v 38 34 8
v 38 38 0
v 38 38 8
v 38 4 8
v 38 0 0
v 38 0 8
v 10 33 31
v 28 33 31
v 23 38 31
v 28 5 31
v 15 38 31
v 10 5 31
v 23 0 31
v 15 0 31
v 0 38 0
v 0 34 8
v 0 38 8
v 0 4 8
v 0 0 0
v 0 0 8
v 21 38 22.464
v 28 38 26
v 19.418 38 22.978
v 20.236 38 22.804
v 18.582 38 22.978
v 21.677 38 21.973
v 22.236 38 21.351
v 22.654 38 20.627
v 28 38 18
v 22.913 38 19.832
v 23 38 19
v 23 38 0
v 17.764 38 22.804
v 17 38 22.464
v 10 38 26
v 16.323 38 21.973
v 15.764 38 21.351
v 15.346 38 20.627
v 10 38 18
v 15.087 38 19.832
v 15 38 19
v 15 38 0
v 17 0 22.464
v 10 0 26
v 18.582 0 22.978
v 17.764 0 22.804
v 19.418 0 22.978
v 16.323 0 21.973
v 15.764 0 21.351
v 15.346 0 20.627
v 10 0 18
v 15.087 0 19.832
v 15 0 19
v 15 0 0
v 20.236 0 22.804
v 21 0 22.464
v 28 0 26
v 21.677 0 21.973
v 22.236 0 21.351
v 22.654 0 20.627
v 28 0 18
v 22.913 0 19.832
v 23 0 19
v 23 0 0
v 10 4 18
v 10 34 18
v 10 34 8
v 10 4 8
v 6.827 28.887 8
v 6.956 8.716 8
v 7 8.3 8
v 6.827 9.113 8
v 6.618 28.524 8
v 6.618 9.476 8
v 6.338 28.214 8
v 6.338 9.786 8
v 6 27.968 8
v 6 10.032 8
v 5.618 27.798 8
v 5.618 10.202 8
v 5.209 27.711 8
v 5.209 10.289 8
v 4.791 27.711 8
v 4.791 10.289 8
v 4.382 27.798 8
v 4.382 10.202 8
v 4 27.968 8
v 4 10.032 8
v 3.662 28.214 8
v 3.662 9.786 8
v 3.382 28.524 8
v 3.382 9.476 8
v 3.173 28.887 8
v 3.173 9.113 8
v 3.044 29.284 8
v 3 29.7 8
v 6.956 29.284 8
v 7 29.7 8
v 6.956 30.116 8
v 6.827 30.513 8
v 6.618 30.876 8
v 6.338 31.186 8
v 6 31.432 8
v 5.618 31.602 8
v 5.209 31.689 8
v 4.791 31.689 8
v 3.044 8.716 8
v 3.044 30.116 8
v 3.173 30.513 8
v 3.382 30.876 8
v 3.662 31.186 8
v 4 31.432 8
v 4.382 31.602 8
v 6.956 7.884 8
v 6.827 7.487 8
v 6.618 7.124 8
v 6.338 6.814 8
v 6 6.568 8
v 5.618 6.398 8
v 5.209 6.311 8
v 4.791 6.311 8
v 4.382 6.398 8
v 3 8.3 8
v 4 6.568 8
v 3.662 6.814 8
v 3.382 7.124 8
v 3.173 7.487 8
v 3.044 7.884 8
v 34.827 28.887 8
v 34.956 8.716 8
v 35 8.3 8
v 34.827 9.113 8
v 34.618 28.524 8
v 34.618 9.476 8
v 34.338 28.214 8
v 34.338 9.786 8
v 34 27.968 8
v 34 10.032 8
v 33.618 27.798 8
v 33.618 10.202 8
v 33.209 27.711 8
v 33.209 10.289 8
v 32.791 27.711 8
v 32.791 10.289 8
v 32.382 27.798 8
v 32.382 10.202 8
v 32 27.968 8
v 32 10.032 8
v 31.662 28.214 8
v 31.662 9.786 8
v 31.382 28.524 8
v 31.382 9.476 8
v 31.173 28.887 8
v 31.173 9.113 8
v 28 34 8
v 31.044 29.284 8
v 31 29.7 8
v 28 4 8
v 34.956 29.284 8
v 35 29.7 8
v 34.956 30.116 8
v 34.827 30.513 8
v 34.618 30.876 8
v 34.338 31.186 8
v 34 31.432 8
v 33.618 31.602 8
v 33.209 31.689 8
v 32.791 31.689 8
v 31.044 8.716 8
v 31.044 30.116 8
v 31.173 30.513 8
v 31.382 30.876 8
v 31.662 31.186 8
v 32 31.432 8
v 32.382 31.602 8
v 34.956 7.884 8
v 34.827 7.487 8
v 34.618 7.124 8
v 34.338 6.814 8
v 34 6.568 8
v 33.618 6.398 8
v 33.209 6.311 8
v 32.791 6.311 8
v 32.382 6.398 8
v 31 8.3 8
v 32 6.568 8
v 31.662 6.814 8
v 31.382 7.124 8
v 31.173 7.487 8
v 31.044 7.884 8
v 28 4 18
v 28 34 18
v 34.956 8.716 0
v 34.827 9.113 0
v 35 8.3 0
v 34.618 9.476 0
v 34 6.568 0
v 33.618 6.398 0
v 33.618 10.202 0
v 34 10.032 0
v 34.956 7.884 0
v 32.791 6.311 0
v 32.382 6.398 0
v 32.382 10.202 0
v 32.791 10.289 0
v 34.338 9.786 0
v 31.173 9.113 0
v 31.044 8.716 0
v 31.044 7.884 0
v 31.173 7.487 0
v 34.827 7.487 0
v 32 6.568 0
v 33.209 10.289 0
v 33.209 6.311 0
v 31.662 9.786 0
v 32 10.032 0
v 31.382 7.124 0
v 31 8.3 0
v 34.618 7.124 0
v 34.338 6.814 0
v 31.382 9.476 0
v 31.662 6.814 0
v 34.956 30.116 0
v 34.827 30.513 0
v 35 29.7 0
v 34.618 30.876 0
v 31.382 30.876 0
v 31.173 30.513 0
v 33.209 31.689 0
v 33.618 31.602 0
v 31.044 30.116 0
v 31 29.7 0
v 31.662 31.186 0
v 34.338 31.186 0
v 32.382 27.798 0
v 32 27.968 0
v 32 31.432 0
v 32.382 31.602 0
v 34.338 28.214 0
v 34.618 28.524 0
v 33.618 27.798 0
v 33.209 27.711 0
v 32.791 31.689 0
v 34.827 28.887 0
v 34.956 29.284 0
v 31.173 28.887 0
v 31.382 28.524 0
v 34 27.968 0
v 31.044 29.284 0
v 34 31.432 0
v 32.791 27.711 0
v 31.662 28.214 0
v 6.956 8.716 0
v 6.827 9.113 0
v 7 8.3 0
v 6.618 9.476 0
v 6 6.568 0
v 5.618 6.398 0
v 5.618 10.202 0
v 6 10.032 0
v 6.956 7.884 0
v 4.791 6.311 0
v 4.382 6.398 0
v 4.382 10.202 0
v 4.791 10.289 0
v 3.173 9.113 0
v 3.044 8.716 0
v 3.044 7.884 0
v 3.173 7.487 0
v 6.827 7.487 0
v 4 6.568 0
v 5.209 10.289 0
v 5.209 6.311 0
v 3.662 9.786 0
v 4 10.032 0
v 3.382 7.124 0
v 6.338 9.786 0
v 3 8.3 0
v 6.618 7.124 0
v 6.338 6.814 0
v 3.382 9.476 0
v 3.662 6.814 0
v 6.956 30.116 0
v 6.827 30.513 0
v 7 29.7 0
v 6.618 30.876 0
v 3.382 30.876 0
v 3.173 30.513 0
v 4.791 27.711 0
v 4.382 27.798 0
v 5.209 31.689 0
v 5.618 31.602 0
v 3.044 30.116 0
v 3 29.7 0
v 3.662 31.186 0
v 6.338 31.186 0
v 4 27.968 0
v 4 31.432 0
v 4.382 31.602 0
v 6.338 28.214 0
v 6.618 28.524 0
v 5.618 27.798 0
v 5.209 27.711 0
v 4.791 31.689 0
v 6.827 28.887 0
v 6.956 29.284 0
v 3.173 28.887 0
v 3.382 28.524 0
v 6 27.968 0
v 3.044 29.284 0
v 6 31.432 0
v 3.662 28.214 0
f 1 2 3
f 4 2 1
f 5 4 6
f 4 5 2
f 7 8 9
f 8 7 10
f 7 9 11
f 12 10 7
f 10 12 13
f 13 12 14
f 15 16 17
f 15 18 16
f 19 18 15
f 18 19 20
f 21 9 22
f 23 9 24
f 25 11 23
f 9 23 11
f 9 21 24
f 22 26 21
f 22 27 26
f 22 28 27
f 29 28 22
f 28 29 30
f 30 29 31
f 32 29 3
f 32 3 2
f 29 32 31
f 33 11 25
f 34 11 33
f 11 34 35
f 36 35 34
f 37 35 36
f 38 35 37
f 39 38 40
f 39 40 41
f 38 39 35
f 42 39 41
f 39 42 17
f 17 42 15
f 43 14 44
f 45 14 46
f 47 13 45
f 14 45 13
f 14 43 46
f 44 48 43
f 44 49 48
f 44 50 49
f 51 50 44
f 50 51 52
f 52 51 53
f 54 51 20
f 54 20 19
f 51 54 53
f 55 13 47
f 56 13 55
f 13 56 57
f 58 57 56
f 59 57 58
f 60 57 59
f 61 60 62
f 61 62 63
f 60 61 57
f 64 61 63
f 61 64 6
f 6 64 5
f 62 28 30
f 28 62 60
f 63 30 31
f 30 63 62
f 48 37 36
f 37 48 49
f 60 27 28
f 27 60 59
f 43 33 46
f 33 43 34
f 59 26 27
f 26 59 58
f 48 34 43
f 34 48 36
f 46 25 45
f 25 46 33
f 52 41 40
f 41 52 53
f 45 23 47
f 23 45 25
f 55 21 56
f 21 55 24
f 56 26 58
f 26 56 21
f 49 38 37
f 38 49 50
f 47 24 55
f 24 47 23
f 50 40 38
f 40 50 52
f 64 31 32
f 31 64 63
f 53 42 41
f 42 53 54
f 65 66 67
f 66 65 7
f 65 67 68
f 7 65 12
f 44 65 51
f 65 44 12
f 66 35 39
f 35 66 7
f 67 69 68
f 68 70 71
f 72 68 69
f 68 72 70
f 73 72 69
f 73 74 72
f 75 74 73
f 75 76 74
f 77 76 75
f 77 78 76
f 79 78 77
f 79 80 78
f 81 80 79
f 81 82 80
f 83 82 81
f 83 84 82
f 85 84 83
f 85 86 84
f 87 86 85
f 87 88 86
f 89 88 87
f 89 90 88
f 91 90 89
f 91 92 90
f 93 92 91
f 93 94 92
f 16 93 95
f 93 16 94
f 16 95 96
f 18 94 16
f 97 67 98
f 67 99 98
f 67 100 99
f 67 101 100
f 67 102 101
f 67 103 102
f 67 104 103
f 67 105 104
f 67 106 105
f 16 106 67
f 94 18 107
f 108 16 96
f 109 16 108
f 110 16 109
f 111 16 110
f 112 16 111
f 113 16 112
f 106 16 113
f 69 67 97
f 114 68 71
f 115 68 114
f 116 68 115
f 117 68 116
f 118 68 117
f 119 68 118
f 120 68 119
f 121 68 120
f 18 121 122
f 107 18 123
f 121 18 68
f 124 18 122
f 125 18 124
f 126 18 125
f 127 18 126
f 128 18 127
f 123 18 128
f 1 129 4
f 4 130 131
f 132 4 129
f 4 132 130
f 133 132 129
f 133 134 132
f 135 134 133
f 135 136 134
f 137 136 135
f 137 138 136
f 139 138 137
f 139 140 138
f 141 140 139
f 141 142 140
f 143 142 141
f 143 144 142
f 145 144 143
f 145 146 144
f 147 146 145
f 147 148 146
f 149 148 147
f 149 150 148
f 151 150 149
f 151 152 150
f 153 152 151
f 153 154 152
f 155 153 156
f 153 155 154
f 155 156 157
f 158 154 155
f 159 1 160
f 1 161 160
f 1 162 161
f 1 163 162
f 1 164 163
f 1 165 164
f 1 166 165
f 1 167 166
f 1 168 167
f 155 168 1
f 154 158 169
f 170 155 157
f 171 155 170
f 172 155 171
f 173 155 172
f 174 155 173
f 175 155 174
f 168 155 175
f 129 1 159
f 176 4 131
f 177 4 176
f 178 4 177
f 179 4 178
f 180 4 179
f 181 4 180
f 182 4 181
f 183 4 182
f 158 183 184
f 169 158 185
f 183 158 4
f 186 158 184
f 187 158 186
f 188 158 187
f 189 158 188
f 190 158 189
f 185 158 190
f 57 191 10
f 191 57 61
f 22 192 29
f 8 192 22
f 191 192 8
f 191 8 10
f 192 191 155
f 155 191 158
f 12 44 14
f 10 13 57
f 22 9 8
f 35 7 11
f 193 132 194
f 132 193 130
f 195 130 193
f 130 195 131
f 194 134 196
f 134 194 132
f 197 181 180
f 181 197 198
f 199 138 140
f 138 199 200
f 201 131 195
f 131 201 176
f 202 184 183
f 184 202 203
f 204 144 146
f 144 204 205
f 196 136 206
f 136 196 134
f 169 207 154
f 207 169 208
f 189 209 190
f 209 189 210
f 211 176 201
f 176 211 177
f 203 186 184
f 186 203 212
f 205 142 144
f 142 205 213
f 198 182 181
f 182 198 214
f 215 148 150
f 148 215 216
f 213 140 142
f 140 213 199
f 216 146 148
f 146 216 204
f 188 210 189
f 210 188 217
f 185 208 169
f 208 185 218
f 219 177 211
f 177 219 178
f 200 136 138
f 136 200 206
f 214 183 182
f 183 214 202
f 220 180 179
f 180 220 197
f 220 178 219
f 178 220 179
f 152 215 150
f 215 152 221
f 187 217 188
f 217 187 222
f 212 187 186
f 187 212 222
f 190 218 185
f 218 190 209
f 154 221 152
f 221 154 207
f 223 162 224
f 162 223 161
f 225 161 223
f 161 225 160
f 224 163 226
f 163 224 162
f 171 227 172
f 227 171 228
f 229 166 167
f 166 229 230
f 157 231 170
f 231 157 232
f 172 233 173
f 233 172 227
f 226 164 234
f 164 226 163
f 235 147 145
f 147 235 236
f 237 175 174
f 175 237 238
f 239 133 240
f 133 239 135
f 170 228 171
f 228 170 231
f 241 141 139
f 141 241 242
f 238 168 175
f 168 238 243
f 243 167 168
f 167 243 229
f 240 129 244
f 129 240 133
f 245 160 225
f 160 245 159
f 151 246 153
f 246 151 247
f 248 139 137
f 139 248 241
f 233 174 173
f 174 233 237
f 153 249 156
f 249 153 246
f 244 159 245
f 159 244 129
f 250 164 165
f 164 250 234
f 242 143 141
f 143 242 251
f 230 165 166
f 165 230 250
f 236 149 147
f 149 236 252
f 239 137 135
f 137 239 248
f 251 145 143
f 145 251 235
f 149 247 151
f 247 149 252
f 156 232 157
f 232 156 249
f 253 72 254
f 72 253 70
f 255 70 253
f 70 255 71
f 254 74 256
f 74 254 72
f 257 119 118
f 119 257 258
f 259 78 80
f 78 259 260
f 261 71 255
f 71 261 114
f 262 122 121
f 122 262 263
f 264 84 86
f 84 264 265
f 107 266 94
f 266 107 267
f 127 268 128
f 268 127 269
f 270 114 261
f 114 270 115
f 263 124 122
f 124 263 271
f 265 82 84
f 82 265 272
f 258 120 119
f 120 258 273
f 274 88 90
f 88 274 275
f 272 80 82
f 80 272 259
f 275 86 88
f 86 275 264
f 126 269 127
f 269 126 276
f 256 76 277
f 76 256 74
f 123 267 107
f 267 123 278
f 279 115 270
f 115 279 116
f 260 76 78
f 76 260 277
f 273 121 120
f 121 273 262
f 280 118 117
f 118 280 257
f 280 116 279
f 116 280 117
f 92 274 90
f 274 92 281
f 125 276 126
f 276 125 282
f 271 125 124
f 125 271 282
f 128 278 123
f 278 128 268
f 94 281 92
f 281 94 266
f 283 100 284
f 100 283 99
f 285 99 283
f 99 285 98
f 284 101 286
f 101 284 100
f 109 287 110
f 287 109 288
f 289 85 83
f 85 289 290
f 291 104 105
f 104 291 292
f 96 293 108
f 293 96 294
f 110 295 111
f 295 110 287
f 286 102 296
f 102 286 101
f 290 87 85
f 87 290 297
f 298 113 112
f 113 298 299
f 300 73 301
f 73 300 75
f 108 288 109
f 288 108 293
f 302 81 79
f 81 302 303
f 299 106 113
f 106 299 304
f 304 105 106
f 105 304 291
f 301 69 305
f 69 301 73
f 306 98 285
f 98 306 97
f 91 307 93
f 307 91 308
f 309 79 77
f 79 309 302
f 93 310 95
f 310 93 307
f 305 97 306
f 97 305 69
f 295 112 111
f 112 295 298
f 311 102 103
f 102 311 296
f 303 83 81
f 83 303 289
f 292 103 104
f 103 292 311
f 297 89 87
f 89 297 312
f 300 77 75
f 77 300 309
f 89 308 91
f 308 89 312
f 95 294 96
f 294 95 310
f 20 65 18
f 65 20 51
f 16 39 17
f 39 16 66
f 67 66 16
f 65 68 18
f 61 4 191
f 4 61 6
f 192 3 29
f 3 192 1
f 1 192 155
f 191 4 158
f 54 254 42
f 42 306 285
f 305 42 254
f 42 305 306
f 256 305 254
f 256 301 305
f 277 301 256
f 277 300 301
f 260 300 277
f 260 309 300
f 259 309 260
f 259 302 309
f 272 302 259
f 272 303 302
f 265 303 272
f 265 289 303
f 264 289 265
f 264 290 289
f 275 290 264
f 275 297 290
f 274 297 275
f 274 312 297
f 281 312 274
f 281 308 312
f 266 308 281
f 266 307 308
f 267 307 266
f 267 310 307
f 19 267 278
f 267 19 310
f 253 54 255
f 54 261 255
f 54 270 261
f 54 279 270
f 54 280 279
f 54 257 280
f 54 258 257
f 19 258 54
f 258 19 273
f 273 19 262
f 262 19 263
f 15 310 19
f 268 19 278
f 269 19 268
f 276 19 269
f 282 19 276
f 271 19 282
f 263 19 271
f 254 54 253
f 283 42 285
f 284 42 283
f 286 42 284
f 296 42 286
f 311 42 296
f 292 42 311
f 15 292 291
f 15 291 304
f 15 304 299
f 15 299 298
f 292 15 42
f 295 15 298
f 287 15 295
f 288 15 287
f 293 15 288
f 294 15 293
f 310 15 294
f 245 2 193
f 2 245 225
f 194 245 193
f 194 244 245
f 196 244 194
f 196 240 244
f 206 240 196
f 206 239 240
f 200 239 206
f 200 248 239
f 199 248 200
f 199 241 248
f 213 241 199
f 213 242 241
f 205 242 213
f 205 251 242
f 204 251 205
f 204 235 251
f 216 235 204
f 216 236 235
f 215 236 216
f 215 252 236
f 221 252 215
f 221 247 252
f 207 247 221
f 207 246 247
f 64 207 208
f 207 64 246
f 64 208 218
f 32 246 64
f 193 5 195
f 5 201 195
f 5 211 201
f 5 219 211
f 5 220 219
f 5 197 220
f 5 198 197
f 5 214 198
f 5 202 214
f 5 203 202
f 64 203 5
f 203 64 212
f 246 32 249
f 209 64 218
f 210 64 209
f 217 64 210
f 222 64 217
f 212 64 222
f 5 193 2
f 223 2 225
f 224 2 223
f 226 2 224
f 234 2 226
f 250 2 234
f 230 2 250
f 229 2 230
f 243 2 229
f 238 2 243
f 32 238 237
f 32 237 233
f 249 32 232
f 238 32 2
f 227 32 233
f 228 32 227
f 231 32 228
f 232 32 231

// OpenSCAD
difference() {
    translate([0,0,-1]){
        difference() {
            difference() {
                difference() {
                    cube([38,38,32]);
                    translate([19,39
                    ,20])rotate([90,0,0])cylinder(h=40, r=4, $fs=0.01);
                    translate([15,-1,0])cube([8,40,20]);
                    translate([0,-1,9])cube([10,40,30]);
                    translate([28,-1,9])cube([10,40,30]);
                }
            }

            difference() {
                translate([10,0,27])cube([18,10,5]);
                translate([19,9,27])cylinder(5,18,13,$fn=4);
            }
            translate([0,28,0])difference() {
                translate([10,0,27])cube([18,10,5]);
                translate([19,1,27])cylinder(5,18,13,$fn=4);
            }

            translate([33,8.3,0])cylinder(h=12, r=2, $fs=0.01);
            translate([33,29.7,0])cylinder(h=12, r=2, $fs=0.01);
            translate([5,8.3,0])cylinder(h=12, r=2, $fs=0.01);
            translate([5,29.7,0])cylinder(h=12, r=2, $fs=0.01);
            
        }

        difference() {
            translate([0,0,9])intersection() {
                rotate([0,45,0])cube([15,38,15]);
                cube([10,38,10]);
            }
            translate([0,4,9])cube([10,30,10]);
        }


        rotate([0,90,0])difference() {
            translate([-19,0,28])intersection() {
                rotate([0,45,0])cube([15,38,15]);
                cube([10,38,10]);
            }
            translate([-19,4,28])cube([10,30,10]);
        }
    }
    translate([0,0,-5])cube([40,40,5]);
}
